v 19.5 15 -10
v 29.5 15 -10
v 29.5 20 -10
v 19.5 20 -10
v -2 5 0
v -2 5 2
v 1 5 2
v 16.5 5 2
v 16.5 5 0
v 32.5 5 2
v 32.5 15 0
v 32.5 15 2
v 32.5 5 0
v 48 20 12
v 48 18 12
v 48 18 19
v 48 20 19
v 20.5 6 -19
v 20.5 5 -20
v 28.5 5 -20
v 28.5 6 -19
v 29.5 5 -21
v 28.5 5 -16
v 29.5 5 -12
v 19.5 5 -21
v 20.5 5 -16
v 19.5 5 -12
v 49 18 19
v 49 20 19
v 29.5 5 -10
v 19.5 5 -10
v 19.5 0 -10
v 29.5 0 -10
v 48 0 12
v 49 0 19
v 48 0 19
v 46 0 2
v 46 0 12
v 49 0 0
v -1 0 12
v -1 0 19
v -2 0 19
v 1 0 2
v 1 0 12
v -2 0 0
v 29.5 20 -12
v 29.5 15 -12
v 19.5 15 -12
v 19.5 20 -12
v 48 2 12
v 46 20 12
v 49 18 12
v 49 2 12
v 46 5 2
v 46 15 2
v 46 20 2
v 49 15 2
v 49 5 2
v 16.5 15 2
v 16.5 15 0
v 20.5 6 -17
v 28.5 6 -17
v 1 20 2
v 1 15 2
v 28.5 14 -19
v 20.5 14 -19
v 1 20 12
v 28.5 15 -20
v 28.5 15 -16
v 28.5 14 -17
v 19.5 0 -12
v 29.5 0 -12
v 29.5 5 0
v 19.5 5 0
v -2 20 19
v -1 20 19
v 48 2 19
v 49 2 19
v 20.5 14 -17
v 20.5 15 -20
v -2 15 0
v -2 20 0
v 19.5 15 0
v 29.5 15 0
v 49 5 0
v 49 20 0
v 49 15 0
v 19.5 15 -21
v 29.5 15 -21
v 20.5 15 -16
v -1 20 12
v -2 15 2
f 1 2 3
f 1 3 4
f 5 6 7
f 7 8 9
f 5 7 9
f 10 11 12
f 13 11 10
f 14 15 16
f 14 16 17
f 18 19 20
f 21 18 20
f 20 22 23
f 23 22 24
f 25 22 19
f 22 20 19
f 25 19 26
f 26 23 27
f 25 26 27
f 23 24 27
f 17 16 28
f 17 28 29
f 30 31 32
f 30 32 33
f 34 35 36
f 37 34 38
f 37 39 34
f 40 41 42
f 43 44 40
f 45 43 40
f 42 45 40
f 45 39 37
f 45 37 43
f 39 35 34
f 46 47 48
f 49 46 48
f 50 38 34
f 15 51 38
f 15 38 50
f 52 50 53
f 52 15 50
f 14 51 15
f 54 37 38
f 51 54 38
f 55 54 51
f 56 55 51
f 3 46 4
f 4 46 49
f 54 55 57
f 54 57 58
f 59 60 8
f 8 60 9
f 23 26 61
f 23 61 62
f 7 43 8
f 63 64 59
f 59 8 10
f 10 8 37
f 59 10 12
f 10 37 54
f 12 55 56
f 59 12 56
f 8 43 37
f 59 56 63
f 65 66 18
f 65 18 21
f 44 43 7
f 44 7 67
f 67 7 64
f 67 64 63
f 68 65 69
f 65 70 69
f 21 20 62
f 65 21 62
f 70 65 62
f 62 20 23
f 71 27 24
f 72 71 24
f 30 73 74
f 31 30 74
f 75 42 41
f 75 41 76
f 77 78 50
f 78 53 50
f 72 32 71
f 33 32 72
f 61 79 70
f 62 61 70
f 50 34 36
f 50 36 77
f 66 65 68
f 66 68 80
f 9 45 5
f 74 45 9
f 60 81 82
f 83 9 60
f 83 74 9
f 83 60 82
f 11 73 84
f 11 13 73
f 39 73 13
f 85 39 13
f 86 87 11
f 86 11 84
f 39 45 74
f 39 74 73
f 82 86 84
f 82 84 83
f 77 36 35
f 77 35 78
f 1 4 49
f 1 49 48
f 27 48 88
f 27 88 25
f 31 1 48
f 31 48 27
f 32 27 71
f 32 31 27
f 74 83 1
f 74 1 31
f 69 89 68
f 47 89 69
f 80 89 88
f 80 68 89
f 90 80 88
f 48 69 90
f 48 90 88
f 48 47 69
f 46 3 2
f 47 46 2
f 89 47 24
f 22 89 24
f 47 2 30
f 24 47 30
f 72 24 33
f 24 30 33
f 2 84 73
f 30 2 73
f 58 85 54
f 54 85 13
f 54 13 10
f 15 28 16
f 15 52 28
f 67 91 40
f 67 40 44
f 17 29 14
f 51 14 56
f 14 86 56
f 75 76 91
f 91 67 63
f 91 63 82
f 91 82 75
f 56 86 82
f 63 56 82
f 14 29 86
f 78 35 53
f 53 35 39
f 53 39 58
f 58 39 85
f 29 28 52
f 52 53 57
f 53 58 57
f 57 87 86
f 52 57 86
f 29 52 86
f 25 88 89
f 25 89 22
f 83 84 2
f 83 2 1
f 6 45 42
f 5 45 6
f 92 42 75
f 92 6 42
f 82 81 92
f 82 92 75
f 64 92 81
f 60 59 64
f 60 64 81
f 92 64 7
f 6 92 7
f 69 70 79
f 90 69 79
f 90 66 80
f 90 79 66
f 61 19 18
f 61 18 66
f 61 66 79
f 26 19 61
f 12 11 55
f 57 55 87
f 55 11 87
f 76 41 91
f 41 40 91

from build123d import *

# Parameters (mm, degrees)
SKETCH_W           = 49
SKETCH_H           = 20
PAD_DEPTH          = 2
SKETCH001_W        = 10
SKETCH001_H        = 10
PAD001_DEPTH       = 5
SKETCH002_W        = 13.5
SKETCH002_H        = 10
POCKET_DEPTH       = 5
SKETCH003_W        = 3
SKETCH003_H        = 20
PAD002_DEPTH       = 10
SKETCH004_W        = 1
SKETCH004_H        = 2
PAD003_DEPTH       = 2
PAD003_FACE1_W     = 20
PAD003_FACE1_H     = 2
PAD004_DEPTH       = 2
SKETCH005_W        = 3
SKETCH005_H        = 20
PAD005_DEPTH       = 10
SKETCH006_W        = 1
SKETCH006_H        = 20
PAD006_DEPTH       = 2
PAD006_FACE9_W     = 10
PAD006_FACE9_H     = 2
POCKET001_DEPTH    = 5
SKETCH007_W        = 10
SKETCH007_H        = 2
POCKET002_DEPTH    = 5
POCKET002_FACE22_W = 20
POCKET002_FACE22_H = 1
PAD007_DEPTH       = 5
PAD007_FACE13_W    = 2
PAD007_FACE13_H    = 1
PAD008_DEPTH       = 5
PAD008_FACE22_W    = 2
PAD008_FACE22_H    = 1
PAD009_DEPTH       = 5
PAD009_FACE26_W    = 10
PAD009_FACE26_H    = 10
PAD010_DEPTH       = 15
SKETCH009_W        = 10
SKETCH009_H        = 2
PAD011_DEPTH       = 5
PAD011_FACE29_W    = 10
PAD011_FACE29_H    = 10
PAD012_DEPTH       = 3
SKETCH010_W        = 8
SKETCH010_H        = 2
POCKET003_DEPTH    = 15.001
CHAMFER_SIZE       = 1
CHAMFER_FACE27_W   = 10
CHAMFER_FACE27_H   = 2
PAD013_DEPTH       = 20


with BuildPart() as part:
    # Sketch → Pad (new body)
    with BuildSketch(Plane.XY):
        with Locations((24.5, 10)):
            Rectangle(SKETCH_W, SKETCH_H)
    extrude(amount=PAD_DEPTH)

    # Sketch001 (on Face6 of Pad) → Pad001 (join)
    with BuildSketch(Plane.XY.offset(2)):
        with Locations((24.5, 10)):
            Rectangle(SKETCH001_W, SKETCH001_H)
    extrude(amount=-PAD001_DEPTH)

    # Sketch002 (on Face4 of Pad001) → Pocket (cut)
    with BuildSketch(Plane(origin=(0, 0, 0), x_dir=(1, 0, 0), z_dir=(0, 0, -1))):
        with Locations((39.25, -10)):
            Rectangle(SKETCH002_W, SKETCH002_H)
        with Locations((9.75, -10)):
            Rectangle(SKETCH002_W, SKETCH002_H)
    extrude(amount=-POCKET_DEPTH, mode=Mode.SUBTRACT)

    # Sketch003 (on Face5 of Pocket) → Pad002 (join)
    with BuildSketch(Plane.XY.offset(2)):
        with Locations((47.5, 10)):
            Rectangle(SKETCH003_W, SKETCH003_H)
    extrude(amount=PAD002_DEPTH)

    # Sketch004 (on Face17 of Pad002) → Pad003 (join)
    with BuildSketch(Plane.XY.offset(12)):
        with Locations((48.5, 19)):
            Rectangle(SKETCH004_W, SKETCH004_H)
        with Locations((48.5, 1)):
            Rectangle(SKETCH004_W, SKETCH004_H)
    extrude(amount=PAD003_DEPTH)

    # Pad003 Face1 → Pad004 (add)
    with BuildSketch(Plane(origin=(0, 10, 1), x_dir=(0, 1, 0), z_dir=(-1, 0, 0))):
        Rectangle(PAD003_FACE1_W, PAD003_FACE1_H)
    extrude(amount=PAD004_DEPTH)

    # Sketch005 (on Face26 of Pad004) → Pad005 (join)
    with BuildSketch(Plane.XY.offset(2)):
        with Locations((-0.5, 10)):
            Rectangle(SKETCH005_W, SKETCH005_H)
    extrude(amount=PAD005_DEPTH)

    # Sketch006 (on Face22 of Pad005) → Pad006 (join)
    with BuildSketch(Plane.XY.offset(12)):
        with Locations((-1.5, 10)):
            Rectangle(SKETCH006_W, SKETCH006_H)
    extrude(amount=PAD006_DEPTH)

    # Pad006 Face9 → Pocket001 (cut)
    with BuildSketch(Plane(origin=(3, 10, 1), x_dir=(0, -1, 0), z_dir=(1, 0, 0))):
        Rectangle(PAD006_FACE9_W, PAD006_FACE9_H)
    extrude(amount=-POCKET001_DEPTH, mode=Mode.SUBTRACT)

    # Sketch007 (on Face8 of Pocket001) → Pocket002 (cut)
    with BuildSketch(Plane(origin=(46, 0, 0), x_dir=(0, -1, 0), z_dir=(-1, 0, 0))):
        with Locations((-10, 1)):
            Rectangle(SKETCH007_W, SKETCH007_H)
    extrude(amount=-POCKET002_DEPTH, mode=Mode.SUBTRACT)

    # Pocket002 Face22 → Pad007 (add)
    with BuildSketch(Plane(origin=(-1.5, 10, 14), x_dir=(0, 1, 0), z_dir=(0, 0, 1))):
        Rectangle(POCKET002_FACE22_W, POCKET002_FACE22_H)
    extrude(amount=PAD007_DEPTH)

    # Pad007 Face13 → Pad008 (add)
    with BuildSketch(Plane(origin=(48.5, 1, 14), x_dir=(0, 1, 0), z_dir=(0, 0, 1))):
        Rectangle(PAD007_FACE13_W, PAD007_FACE13_H)
    extrude(amount=PAD008_DEPTH)

    # Pad008 Face22 → Pad009 (add)
    with BuildSketch(Plane(origin=(48.5, 19, 14), x_dir=(0, 1, 0), z_dir=(0, 0, 1))):
        Rectangle(PAD008_FACE22_W, PAD008_FACE22_H)
    extrude(amount=PAD009_DEPTH)

    # Pad009 Face26 → Pad010 (add)
    with BuildSketch(Plane(origin=(24.5, 10, -3), x_dir=(0, -1, 0), z_dir=(0, 0, -1))):
        Rectangle(PAD009_FACE26_W, PAD009_FACE26_H)
    extrude(amount=PAD010_DEPTH)

    # Sketch009 (on Face27 of Pad010) → Pad011 (join)
    with BuildSketch(Plane.XZ.offset(-5)):
        with Locations((24.5, -11)):
            Rectangle(SKETCH009_W, SKETCH009_H)
    extrude(amount=PAD011_DEPTH)

    # Pad011 Face29 → Pad012 (add)
    with BuildSketch(Plane(origin=(24.5, 10, -18), x_dir=(0, -1, 0), z_dir=(0, 0, -1))):
        Rectangle(PAD011_FACE29_W, PAD011_FACE29_H)
    extrude(amount=PAD012_DEPTH)

    # Sketch010 (on Face31 of Pad012) → Pocket003 (cut, through all)
    with BuildSketch(Plane.XZ.offset(-5)):
        with Locations((24.5, -18)):
            Rectangle(SKETCH010_W, SKETCH010_H)
    extrude(amount=-POCKET003_DEPTH, mode=Mode.SUBTRACT)

    # Chamfer
    chamfer_edges = [part.edges().sort_by_distance(p)[0] for p in [
        (24.5, 5, -17),
        (24.5, 5, -19),
        (24.5, 15, -17),
        (24.5, 15, -19),
    ]]
    chamfer(chamfer_edges, length=CHAMFER_SIZE)

    # Chamfer Face27 → Pad013 (add)
    with BuildSketch(Plane(origin=(24.5, 0, -11), x_dir=(-1, 0, 0), z_dir=(0, -1, 0))):
        Rectangle(CHAMFER_FACE27_W, CHAMFER_FACE27_H)
    extrude(amount=-PAD013_DEPTH)


solid = part.part
